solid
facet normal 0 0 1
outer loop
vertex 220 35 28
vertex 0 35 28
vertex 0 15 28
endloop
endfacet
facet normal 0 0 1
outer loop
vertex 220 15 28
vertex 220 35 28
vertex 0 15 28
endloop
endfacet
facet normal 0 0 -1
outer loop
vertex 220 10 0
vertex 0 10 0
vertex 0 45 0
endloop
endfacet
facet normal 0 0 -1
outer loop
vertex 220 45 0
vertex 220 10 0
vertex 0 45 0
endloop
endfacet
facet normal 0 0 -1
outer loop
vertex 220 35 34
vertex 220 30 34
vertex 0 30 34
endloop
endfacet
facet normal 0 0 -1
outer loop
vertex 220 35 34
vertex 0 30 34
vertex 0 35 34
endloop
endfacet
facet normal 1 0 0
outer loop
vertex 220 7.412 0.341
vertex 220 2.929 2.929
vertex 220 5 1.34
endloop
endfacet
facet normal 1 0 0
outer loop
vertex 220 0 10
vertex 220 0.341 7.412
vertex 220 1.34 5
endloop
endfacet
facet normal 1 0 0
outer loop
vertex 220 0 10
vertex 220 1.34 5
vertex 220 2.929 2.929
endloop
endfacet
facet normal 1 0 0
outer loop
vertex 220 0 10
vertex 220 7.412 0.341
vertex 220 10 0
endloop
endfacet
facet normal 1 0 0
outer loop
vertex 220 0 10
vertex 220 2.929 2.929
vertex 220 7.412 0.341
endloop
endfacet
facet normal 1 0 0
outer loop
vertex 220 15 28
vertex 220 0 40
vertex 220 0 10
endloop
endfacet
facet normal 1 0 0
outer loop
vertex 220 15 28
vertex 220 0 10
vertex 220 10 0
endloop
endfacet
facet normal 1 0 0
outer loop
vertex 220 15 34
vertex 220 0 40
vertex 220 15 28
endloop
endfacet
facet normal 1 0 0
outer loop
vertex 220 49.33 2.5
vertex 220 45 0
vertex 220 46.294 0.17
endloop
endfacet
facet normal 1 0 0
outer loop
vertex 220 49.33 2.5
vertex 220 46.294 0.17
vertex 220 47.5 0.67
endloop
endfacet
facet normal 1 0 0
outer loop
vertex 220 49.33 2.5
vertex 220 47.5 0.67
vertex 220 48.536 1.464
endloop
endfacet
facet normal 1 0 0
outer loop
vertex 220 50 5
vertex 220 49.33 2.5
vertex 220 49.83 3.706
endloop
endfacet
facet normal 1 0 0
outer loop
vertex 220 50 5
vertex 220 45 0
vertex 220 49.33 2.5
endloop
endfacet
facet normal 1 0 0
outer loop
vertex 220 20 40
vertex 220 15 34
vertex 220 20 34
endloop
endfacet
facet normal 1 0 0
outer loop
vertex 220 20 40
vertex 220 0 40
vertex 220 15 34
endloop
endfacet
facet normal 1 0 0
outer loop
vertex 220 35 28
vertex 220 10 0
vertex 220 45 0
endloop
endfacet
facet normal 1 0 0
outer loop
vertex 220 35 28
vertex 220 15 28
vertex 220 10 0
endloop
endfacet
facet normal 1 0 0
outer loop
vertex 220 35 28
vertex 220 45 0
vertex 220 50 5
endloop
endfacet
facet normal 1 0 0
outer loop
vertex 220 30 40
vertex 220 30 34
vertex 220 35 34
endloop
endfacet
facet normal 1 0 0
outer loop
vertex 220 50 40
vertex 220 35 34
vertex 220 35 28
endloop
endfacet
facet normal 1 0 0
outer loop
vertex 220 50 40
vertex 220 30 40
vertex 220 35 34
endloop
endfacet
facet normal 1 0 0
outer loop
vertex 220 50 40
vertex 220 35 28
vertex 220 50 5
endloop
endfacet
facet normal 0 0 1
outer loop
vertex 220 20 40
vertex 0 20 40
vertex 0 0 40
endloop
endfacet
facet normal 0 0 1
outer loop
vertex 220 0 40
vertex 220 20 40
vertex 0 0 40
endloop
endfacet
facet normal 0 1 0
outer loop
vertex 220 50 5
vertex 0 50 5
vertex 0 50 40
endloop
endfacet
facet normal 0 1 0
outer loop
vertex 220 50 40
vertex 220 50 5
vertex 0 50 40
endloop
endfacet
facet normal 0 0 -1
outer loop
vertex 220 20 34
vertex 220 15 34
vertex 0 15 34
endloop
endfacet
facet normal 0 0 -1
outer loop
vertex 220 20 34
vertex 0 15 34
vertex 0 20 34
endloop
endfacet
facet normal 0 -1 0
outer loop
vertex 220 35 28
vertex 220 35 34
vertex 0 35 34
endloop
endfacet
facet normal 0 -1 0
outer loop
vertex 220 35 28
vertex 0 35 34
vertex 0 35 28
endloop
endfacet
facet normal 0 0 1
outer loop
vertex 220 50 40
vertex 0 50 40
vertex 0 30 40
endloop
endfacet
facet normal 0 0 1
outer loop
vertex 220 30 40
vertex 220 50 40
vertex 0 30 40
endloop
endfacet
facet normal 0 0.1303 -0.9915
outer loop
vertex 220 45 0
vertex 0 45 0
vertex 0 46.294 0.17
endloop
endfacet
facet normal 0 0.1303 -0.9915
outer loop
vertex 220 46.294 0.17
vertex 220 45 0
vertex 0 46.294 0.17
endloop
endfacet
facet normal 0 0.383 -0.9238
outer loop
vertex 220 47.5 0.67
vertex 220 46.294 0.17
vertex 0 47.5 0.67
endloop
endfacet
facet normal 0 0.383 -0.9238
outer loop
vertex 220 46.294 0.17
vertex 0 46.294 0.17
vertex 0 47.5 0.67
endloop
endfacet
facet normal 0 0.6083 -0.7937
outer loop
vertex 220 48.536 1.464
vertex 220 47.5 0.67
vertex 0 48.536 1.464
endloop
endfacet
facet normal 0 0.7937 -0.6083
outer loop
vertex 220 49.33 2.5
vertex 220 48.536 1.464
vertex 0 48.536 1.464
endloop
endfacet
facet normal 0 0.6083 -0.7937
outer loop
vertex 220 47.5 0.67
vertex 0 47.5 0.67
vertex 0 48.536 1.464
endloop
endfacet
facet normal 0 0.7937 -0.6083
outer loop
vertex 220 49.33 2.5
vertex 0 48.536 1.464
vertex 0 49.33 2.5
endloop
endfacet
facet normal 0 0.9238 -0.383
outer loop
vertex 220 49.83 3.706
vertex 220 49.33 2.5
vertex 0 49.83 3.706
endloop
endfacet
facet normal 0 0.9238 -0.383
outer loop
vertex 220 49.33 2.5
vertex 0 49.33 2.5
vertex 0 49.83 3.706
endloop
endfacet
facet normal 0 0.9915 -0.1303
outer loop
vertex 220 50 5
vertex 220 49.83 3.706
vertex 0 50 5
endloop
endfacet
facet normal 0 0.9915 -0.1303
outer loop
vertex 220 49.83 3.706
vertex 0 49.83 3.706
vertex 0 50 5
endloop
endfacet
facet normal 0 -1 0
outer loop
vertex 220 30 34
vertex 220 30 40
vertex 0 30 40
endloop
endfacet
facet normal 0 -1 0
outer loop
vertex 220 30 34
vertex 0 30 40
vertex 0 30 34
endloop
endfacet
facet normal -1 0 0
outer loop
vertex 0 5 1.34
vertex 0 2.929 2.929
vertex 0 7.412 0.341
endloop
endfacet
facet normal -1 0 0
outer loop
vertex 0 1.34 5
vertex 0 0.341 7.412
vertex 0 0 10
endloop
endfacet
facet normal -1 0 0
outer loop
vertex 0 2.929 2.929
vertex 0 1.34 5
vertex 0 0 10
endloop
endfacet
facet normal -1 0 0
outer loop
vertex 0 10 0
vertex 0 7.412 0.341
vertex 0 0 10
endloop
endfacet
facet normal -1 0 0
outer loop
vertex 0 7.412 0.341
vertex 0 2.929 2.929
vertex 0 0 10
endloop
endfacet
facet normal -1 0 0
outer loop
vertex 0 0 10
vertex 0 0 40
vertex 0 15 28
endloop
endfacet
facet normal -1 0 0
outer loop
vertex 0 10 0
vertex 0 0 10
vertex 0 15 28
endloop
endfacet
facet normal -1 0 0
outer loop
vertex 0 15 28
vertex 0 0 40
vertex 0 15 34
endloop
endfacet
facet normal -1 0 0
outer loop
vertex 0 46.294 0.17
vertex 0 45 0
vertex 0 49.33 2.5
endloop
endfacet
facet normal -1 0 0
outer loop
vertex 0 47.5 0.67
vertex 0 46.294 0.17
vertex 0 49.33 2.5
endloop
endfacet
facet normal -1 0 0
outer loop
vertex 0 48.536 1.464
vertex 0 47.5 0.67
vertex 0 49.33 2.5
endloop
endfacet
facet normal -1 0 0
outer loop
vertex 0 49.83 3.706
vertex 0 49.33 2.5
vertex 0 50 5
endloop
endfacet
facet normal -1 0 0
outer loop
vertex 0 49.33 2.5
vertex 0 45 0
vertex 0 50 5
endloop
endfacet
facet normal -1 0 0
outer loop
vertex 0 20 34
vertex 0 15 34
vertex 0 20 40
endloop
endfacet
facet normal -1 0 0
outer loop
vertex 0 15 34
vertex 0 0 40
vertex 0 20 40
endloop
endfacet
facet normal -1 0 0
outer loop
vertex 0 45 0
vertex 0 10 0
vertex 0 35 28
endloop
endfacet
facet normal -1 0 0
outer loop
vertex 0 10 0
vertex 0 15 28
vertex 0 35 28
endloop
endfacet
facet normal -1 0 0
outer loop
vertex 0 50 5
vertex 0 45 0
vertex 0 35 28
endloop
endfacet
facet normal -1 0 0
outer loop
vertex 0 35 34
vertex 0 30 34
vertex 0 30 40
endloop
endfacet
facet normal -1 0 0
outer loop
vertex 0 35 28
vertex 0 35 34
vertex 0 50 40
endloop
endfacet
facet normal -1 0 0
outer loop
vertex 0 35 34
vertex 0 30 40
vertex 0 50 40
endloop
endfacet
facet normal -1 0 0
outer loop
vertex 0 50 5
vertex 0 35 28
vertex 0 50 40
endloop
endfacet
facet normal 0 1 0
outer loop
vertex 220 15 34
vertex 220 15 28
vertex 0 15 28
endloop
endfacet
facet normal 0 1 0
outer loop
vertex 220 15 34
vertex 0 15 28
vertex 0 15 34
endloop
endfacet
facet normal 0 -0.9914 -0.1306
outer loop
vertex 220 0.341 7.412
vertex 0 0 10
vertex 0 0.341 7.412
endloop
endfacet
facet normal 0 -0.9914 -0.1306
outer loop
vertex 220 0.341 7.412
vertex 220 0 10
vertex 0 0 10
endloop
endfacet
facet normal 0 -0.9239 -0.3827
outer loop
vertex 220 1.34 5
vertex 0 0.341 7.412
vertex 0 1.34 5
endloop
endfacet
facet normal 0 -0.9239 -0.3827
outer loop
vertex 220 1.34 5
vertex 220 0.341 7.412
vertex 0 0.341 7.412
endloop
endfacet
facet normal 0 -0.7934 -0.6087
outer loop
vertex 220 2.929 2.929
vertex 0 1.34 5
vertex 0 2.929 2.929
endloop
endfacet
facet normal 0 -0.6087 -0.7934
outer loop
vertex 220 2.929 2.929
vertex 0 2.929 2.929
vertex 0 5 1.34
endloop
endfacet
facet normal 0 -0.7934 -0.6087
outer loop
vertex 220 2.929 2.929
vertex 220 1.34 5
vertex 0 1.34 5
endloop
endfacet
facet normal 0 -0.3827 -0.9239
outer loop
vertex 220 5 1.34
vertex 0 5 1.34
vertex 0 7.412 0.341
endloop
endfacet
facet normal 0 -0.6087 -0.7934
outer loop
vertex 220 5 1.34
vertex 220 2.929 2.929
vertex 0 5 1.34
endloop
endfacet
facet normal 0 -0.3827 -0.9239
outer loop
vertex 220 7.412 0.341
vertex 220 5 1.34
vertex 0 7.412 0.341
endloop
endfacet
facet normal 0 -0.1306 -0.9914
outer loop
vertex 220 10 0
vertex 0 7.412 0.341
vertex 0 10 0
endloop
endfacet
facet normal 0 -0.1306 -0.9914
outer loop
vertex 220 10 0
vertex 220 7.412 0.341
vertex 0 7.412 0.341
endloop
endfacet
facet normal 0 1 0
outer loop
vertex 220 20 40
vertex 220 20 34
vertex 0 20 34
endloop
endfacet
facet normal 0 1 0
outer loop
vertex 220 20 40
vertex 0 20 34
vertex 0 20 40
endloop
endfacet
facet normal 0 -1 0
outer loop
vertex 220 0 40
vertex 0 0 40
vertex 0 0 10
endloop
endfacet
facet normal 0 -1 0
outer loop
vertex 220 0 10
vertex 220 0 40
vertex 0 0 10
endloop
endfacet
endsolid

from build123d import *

# Parameters (mm, degrees)
F1_DEPTH = 220
F2_R     = 10


with BuildPart() as f1:
    # F0 (on Right) → F1 (new body)
    with BuildSketch(Plane.YZ):
        with BuildLine():
            Line((50, 5), (50, 40))
            Line((50, 40), (30, 40))
            Line((30, 40), (30, 34))
            Line((30, 34), (35, 34))
            Line((35, 34), (35, 28))
            Line((35, 28), (15, 28))
            Line((15, 28), (15, 34))
            Line((15, 34), (20, 34))
            Line((20, 34), (20, 40))
            Line((20, 40), (0, 40))
            Line((0, 40), (0, 0))
            Line((0, 0), (45, 0))
            ThreePointArc((45, 0), (48.535534, 1.464466), (50, 5))
        make_face()
    extrude(amount=F1_DEPTH)

    # F2
    f2_edges = [f1.edges().sort_by_distance(p)[0] for p in [
        (110, 0, 0),
    ]]
    fillet(f2_edges, radius=F2_R)


solid = f1.part
